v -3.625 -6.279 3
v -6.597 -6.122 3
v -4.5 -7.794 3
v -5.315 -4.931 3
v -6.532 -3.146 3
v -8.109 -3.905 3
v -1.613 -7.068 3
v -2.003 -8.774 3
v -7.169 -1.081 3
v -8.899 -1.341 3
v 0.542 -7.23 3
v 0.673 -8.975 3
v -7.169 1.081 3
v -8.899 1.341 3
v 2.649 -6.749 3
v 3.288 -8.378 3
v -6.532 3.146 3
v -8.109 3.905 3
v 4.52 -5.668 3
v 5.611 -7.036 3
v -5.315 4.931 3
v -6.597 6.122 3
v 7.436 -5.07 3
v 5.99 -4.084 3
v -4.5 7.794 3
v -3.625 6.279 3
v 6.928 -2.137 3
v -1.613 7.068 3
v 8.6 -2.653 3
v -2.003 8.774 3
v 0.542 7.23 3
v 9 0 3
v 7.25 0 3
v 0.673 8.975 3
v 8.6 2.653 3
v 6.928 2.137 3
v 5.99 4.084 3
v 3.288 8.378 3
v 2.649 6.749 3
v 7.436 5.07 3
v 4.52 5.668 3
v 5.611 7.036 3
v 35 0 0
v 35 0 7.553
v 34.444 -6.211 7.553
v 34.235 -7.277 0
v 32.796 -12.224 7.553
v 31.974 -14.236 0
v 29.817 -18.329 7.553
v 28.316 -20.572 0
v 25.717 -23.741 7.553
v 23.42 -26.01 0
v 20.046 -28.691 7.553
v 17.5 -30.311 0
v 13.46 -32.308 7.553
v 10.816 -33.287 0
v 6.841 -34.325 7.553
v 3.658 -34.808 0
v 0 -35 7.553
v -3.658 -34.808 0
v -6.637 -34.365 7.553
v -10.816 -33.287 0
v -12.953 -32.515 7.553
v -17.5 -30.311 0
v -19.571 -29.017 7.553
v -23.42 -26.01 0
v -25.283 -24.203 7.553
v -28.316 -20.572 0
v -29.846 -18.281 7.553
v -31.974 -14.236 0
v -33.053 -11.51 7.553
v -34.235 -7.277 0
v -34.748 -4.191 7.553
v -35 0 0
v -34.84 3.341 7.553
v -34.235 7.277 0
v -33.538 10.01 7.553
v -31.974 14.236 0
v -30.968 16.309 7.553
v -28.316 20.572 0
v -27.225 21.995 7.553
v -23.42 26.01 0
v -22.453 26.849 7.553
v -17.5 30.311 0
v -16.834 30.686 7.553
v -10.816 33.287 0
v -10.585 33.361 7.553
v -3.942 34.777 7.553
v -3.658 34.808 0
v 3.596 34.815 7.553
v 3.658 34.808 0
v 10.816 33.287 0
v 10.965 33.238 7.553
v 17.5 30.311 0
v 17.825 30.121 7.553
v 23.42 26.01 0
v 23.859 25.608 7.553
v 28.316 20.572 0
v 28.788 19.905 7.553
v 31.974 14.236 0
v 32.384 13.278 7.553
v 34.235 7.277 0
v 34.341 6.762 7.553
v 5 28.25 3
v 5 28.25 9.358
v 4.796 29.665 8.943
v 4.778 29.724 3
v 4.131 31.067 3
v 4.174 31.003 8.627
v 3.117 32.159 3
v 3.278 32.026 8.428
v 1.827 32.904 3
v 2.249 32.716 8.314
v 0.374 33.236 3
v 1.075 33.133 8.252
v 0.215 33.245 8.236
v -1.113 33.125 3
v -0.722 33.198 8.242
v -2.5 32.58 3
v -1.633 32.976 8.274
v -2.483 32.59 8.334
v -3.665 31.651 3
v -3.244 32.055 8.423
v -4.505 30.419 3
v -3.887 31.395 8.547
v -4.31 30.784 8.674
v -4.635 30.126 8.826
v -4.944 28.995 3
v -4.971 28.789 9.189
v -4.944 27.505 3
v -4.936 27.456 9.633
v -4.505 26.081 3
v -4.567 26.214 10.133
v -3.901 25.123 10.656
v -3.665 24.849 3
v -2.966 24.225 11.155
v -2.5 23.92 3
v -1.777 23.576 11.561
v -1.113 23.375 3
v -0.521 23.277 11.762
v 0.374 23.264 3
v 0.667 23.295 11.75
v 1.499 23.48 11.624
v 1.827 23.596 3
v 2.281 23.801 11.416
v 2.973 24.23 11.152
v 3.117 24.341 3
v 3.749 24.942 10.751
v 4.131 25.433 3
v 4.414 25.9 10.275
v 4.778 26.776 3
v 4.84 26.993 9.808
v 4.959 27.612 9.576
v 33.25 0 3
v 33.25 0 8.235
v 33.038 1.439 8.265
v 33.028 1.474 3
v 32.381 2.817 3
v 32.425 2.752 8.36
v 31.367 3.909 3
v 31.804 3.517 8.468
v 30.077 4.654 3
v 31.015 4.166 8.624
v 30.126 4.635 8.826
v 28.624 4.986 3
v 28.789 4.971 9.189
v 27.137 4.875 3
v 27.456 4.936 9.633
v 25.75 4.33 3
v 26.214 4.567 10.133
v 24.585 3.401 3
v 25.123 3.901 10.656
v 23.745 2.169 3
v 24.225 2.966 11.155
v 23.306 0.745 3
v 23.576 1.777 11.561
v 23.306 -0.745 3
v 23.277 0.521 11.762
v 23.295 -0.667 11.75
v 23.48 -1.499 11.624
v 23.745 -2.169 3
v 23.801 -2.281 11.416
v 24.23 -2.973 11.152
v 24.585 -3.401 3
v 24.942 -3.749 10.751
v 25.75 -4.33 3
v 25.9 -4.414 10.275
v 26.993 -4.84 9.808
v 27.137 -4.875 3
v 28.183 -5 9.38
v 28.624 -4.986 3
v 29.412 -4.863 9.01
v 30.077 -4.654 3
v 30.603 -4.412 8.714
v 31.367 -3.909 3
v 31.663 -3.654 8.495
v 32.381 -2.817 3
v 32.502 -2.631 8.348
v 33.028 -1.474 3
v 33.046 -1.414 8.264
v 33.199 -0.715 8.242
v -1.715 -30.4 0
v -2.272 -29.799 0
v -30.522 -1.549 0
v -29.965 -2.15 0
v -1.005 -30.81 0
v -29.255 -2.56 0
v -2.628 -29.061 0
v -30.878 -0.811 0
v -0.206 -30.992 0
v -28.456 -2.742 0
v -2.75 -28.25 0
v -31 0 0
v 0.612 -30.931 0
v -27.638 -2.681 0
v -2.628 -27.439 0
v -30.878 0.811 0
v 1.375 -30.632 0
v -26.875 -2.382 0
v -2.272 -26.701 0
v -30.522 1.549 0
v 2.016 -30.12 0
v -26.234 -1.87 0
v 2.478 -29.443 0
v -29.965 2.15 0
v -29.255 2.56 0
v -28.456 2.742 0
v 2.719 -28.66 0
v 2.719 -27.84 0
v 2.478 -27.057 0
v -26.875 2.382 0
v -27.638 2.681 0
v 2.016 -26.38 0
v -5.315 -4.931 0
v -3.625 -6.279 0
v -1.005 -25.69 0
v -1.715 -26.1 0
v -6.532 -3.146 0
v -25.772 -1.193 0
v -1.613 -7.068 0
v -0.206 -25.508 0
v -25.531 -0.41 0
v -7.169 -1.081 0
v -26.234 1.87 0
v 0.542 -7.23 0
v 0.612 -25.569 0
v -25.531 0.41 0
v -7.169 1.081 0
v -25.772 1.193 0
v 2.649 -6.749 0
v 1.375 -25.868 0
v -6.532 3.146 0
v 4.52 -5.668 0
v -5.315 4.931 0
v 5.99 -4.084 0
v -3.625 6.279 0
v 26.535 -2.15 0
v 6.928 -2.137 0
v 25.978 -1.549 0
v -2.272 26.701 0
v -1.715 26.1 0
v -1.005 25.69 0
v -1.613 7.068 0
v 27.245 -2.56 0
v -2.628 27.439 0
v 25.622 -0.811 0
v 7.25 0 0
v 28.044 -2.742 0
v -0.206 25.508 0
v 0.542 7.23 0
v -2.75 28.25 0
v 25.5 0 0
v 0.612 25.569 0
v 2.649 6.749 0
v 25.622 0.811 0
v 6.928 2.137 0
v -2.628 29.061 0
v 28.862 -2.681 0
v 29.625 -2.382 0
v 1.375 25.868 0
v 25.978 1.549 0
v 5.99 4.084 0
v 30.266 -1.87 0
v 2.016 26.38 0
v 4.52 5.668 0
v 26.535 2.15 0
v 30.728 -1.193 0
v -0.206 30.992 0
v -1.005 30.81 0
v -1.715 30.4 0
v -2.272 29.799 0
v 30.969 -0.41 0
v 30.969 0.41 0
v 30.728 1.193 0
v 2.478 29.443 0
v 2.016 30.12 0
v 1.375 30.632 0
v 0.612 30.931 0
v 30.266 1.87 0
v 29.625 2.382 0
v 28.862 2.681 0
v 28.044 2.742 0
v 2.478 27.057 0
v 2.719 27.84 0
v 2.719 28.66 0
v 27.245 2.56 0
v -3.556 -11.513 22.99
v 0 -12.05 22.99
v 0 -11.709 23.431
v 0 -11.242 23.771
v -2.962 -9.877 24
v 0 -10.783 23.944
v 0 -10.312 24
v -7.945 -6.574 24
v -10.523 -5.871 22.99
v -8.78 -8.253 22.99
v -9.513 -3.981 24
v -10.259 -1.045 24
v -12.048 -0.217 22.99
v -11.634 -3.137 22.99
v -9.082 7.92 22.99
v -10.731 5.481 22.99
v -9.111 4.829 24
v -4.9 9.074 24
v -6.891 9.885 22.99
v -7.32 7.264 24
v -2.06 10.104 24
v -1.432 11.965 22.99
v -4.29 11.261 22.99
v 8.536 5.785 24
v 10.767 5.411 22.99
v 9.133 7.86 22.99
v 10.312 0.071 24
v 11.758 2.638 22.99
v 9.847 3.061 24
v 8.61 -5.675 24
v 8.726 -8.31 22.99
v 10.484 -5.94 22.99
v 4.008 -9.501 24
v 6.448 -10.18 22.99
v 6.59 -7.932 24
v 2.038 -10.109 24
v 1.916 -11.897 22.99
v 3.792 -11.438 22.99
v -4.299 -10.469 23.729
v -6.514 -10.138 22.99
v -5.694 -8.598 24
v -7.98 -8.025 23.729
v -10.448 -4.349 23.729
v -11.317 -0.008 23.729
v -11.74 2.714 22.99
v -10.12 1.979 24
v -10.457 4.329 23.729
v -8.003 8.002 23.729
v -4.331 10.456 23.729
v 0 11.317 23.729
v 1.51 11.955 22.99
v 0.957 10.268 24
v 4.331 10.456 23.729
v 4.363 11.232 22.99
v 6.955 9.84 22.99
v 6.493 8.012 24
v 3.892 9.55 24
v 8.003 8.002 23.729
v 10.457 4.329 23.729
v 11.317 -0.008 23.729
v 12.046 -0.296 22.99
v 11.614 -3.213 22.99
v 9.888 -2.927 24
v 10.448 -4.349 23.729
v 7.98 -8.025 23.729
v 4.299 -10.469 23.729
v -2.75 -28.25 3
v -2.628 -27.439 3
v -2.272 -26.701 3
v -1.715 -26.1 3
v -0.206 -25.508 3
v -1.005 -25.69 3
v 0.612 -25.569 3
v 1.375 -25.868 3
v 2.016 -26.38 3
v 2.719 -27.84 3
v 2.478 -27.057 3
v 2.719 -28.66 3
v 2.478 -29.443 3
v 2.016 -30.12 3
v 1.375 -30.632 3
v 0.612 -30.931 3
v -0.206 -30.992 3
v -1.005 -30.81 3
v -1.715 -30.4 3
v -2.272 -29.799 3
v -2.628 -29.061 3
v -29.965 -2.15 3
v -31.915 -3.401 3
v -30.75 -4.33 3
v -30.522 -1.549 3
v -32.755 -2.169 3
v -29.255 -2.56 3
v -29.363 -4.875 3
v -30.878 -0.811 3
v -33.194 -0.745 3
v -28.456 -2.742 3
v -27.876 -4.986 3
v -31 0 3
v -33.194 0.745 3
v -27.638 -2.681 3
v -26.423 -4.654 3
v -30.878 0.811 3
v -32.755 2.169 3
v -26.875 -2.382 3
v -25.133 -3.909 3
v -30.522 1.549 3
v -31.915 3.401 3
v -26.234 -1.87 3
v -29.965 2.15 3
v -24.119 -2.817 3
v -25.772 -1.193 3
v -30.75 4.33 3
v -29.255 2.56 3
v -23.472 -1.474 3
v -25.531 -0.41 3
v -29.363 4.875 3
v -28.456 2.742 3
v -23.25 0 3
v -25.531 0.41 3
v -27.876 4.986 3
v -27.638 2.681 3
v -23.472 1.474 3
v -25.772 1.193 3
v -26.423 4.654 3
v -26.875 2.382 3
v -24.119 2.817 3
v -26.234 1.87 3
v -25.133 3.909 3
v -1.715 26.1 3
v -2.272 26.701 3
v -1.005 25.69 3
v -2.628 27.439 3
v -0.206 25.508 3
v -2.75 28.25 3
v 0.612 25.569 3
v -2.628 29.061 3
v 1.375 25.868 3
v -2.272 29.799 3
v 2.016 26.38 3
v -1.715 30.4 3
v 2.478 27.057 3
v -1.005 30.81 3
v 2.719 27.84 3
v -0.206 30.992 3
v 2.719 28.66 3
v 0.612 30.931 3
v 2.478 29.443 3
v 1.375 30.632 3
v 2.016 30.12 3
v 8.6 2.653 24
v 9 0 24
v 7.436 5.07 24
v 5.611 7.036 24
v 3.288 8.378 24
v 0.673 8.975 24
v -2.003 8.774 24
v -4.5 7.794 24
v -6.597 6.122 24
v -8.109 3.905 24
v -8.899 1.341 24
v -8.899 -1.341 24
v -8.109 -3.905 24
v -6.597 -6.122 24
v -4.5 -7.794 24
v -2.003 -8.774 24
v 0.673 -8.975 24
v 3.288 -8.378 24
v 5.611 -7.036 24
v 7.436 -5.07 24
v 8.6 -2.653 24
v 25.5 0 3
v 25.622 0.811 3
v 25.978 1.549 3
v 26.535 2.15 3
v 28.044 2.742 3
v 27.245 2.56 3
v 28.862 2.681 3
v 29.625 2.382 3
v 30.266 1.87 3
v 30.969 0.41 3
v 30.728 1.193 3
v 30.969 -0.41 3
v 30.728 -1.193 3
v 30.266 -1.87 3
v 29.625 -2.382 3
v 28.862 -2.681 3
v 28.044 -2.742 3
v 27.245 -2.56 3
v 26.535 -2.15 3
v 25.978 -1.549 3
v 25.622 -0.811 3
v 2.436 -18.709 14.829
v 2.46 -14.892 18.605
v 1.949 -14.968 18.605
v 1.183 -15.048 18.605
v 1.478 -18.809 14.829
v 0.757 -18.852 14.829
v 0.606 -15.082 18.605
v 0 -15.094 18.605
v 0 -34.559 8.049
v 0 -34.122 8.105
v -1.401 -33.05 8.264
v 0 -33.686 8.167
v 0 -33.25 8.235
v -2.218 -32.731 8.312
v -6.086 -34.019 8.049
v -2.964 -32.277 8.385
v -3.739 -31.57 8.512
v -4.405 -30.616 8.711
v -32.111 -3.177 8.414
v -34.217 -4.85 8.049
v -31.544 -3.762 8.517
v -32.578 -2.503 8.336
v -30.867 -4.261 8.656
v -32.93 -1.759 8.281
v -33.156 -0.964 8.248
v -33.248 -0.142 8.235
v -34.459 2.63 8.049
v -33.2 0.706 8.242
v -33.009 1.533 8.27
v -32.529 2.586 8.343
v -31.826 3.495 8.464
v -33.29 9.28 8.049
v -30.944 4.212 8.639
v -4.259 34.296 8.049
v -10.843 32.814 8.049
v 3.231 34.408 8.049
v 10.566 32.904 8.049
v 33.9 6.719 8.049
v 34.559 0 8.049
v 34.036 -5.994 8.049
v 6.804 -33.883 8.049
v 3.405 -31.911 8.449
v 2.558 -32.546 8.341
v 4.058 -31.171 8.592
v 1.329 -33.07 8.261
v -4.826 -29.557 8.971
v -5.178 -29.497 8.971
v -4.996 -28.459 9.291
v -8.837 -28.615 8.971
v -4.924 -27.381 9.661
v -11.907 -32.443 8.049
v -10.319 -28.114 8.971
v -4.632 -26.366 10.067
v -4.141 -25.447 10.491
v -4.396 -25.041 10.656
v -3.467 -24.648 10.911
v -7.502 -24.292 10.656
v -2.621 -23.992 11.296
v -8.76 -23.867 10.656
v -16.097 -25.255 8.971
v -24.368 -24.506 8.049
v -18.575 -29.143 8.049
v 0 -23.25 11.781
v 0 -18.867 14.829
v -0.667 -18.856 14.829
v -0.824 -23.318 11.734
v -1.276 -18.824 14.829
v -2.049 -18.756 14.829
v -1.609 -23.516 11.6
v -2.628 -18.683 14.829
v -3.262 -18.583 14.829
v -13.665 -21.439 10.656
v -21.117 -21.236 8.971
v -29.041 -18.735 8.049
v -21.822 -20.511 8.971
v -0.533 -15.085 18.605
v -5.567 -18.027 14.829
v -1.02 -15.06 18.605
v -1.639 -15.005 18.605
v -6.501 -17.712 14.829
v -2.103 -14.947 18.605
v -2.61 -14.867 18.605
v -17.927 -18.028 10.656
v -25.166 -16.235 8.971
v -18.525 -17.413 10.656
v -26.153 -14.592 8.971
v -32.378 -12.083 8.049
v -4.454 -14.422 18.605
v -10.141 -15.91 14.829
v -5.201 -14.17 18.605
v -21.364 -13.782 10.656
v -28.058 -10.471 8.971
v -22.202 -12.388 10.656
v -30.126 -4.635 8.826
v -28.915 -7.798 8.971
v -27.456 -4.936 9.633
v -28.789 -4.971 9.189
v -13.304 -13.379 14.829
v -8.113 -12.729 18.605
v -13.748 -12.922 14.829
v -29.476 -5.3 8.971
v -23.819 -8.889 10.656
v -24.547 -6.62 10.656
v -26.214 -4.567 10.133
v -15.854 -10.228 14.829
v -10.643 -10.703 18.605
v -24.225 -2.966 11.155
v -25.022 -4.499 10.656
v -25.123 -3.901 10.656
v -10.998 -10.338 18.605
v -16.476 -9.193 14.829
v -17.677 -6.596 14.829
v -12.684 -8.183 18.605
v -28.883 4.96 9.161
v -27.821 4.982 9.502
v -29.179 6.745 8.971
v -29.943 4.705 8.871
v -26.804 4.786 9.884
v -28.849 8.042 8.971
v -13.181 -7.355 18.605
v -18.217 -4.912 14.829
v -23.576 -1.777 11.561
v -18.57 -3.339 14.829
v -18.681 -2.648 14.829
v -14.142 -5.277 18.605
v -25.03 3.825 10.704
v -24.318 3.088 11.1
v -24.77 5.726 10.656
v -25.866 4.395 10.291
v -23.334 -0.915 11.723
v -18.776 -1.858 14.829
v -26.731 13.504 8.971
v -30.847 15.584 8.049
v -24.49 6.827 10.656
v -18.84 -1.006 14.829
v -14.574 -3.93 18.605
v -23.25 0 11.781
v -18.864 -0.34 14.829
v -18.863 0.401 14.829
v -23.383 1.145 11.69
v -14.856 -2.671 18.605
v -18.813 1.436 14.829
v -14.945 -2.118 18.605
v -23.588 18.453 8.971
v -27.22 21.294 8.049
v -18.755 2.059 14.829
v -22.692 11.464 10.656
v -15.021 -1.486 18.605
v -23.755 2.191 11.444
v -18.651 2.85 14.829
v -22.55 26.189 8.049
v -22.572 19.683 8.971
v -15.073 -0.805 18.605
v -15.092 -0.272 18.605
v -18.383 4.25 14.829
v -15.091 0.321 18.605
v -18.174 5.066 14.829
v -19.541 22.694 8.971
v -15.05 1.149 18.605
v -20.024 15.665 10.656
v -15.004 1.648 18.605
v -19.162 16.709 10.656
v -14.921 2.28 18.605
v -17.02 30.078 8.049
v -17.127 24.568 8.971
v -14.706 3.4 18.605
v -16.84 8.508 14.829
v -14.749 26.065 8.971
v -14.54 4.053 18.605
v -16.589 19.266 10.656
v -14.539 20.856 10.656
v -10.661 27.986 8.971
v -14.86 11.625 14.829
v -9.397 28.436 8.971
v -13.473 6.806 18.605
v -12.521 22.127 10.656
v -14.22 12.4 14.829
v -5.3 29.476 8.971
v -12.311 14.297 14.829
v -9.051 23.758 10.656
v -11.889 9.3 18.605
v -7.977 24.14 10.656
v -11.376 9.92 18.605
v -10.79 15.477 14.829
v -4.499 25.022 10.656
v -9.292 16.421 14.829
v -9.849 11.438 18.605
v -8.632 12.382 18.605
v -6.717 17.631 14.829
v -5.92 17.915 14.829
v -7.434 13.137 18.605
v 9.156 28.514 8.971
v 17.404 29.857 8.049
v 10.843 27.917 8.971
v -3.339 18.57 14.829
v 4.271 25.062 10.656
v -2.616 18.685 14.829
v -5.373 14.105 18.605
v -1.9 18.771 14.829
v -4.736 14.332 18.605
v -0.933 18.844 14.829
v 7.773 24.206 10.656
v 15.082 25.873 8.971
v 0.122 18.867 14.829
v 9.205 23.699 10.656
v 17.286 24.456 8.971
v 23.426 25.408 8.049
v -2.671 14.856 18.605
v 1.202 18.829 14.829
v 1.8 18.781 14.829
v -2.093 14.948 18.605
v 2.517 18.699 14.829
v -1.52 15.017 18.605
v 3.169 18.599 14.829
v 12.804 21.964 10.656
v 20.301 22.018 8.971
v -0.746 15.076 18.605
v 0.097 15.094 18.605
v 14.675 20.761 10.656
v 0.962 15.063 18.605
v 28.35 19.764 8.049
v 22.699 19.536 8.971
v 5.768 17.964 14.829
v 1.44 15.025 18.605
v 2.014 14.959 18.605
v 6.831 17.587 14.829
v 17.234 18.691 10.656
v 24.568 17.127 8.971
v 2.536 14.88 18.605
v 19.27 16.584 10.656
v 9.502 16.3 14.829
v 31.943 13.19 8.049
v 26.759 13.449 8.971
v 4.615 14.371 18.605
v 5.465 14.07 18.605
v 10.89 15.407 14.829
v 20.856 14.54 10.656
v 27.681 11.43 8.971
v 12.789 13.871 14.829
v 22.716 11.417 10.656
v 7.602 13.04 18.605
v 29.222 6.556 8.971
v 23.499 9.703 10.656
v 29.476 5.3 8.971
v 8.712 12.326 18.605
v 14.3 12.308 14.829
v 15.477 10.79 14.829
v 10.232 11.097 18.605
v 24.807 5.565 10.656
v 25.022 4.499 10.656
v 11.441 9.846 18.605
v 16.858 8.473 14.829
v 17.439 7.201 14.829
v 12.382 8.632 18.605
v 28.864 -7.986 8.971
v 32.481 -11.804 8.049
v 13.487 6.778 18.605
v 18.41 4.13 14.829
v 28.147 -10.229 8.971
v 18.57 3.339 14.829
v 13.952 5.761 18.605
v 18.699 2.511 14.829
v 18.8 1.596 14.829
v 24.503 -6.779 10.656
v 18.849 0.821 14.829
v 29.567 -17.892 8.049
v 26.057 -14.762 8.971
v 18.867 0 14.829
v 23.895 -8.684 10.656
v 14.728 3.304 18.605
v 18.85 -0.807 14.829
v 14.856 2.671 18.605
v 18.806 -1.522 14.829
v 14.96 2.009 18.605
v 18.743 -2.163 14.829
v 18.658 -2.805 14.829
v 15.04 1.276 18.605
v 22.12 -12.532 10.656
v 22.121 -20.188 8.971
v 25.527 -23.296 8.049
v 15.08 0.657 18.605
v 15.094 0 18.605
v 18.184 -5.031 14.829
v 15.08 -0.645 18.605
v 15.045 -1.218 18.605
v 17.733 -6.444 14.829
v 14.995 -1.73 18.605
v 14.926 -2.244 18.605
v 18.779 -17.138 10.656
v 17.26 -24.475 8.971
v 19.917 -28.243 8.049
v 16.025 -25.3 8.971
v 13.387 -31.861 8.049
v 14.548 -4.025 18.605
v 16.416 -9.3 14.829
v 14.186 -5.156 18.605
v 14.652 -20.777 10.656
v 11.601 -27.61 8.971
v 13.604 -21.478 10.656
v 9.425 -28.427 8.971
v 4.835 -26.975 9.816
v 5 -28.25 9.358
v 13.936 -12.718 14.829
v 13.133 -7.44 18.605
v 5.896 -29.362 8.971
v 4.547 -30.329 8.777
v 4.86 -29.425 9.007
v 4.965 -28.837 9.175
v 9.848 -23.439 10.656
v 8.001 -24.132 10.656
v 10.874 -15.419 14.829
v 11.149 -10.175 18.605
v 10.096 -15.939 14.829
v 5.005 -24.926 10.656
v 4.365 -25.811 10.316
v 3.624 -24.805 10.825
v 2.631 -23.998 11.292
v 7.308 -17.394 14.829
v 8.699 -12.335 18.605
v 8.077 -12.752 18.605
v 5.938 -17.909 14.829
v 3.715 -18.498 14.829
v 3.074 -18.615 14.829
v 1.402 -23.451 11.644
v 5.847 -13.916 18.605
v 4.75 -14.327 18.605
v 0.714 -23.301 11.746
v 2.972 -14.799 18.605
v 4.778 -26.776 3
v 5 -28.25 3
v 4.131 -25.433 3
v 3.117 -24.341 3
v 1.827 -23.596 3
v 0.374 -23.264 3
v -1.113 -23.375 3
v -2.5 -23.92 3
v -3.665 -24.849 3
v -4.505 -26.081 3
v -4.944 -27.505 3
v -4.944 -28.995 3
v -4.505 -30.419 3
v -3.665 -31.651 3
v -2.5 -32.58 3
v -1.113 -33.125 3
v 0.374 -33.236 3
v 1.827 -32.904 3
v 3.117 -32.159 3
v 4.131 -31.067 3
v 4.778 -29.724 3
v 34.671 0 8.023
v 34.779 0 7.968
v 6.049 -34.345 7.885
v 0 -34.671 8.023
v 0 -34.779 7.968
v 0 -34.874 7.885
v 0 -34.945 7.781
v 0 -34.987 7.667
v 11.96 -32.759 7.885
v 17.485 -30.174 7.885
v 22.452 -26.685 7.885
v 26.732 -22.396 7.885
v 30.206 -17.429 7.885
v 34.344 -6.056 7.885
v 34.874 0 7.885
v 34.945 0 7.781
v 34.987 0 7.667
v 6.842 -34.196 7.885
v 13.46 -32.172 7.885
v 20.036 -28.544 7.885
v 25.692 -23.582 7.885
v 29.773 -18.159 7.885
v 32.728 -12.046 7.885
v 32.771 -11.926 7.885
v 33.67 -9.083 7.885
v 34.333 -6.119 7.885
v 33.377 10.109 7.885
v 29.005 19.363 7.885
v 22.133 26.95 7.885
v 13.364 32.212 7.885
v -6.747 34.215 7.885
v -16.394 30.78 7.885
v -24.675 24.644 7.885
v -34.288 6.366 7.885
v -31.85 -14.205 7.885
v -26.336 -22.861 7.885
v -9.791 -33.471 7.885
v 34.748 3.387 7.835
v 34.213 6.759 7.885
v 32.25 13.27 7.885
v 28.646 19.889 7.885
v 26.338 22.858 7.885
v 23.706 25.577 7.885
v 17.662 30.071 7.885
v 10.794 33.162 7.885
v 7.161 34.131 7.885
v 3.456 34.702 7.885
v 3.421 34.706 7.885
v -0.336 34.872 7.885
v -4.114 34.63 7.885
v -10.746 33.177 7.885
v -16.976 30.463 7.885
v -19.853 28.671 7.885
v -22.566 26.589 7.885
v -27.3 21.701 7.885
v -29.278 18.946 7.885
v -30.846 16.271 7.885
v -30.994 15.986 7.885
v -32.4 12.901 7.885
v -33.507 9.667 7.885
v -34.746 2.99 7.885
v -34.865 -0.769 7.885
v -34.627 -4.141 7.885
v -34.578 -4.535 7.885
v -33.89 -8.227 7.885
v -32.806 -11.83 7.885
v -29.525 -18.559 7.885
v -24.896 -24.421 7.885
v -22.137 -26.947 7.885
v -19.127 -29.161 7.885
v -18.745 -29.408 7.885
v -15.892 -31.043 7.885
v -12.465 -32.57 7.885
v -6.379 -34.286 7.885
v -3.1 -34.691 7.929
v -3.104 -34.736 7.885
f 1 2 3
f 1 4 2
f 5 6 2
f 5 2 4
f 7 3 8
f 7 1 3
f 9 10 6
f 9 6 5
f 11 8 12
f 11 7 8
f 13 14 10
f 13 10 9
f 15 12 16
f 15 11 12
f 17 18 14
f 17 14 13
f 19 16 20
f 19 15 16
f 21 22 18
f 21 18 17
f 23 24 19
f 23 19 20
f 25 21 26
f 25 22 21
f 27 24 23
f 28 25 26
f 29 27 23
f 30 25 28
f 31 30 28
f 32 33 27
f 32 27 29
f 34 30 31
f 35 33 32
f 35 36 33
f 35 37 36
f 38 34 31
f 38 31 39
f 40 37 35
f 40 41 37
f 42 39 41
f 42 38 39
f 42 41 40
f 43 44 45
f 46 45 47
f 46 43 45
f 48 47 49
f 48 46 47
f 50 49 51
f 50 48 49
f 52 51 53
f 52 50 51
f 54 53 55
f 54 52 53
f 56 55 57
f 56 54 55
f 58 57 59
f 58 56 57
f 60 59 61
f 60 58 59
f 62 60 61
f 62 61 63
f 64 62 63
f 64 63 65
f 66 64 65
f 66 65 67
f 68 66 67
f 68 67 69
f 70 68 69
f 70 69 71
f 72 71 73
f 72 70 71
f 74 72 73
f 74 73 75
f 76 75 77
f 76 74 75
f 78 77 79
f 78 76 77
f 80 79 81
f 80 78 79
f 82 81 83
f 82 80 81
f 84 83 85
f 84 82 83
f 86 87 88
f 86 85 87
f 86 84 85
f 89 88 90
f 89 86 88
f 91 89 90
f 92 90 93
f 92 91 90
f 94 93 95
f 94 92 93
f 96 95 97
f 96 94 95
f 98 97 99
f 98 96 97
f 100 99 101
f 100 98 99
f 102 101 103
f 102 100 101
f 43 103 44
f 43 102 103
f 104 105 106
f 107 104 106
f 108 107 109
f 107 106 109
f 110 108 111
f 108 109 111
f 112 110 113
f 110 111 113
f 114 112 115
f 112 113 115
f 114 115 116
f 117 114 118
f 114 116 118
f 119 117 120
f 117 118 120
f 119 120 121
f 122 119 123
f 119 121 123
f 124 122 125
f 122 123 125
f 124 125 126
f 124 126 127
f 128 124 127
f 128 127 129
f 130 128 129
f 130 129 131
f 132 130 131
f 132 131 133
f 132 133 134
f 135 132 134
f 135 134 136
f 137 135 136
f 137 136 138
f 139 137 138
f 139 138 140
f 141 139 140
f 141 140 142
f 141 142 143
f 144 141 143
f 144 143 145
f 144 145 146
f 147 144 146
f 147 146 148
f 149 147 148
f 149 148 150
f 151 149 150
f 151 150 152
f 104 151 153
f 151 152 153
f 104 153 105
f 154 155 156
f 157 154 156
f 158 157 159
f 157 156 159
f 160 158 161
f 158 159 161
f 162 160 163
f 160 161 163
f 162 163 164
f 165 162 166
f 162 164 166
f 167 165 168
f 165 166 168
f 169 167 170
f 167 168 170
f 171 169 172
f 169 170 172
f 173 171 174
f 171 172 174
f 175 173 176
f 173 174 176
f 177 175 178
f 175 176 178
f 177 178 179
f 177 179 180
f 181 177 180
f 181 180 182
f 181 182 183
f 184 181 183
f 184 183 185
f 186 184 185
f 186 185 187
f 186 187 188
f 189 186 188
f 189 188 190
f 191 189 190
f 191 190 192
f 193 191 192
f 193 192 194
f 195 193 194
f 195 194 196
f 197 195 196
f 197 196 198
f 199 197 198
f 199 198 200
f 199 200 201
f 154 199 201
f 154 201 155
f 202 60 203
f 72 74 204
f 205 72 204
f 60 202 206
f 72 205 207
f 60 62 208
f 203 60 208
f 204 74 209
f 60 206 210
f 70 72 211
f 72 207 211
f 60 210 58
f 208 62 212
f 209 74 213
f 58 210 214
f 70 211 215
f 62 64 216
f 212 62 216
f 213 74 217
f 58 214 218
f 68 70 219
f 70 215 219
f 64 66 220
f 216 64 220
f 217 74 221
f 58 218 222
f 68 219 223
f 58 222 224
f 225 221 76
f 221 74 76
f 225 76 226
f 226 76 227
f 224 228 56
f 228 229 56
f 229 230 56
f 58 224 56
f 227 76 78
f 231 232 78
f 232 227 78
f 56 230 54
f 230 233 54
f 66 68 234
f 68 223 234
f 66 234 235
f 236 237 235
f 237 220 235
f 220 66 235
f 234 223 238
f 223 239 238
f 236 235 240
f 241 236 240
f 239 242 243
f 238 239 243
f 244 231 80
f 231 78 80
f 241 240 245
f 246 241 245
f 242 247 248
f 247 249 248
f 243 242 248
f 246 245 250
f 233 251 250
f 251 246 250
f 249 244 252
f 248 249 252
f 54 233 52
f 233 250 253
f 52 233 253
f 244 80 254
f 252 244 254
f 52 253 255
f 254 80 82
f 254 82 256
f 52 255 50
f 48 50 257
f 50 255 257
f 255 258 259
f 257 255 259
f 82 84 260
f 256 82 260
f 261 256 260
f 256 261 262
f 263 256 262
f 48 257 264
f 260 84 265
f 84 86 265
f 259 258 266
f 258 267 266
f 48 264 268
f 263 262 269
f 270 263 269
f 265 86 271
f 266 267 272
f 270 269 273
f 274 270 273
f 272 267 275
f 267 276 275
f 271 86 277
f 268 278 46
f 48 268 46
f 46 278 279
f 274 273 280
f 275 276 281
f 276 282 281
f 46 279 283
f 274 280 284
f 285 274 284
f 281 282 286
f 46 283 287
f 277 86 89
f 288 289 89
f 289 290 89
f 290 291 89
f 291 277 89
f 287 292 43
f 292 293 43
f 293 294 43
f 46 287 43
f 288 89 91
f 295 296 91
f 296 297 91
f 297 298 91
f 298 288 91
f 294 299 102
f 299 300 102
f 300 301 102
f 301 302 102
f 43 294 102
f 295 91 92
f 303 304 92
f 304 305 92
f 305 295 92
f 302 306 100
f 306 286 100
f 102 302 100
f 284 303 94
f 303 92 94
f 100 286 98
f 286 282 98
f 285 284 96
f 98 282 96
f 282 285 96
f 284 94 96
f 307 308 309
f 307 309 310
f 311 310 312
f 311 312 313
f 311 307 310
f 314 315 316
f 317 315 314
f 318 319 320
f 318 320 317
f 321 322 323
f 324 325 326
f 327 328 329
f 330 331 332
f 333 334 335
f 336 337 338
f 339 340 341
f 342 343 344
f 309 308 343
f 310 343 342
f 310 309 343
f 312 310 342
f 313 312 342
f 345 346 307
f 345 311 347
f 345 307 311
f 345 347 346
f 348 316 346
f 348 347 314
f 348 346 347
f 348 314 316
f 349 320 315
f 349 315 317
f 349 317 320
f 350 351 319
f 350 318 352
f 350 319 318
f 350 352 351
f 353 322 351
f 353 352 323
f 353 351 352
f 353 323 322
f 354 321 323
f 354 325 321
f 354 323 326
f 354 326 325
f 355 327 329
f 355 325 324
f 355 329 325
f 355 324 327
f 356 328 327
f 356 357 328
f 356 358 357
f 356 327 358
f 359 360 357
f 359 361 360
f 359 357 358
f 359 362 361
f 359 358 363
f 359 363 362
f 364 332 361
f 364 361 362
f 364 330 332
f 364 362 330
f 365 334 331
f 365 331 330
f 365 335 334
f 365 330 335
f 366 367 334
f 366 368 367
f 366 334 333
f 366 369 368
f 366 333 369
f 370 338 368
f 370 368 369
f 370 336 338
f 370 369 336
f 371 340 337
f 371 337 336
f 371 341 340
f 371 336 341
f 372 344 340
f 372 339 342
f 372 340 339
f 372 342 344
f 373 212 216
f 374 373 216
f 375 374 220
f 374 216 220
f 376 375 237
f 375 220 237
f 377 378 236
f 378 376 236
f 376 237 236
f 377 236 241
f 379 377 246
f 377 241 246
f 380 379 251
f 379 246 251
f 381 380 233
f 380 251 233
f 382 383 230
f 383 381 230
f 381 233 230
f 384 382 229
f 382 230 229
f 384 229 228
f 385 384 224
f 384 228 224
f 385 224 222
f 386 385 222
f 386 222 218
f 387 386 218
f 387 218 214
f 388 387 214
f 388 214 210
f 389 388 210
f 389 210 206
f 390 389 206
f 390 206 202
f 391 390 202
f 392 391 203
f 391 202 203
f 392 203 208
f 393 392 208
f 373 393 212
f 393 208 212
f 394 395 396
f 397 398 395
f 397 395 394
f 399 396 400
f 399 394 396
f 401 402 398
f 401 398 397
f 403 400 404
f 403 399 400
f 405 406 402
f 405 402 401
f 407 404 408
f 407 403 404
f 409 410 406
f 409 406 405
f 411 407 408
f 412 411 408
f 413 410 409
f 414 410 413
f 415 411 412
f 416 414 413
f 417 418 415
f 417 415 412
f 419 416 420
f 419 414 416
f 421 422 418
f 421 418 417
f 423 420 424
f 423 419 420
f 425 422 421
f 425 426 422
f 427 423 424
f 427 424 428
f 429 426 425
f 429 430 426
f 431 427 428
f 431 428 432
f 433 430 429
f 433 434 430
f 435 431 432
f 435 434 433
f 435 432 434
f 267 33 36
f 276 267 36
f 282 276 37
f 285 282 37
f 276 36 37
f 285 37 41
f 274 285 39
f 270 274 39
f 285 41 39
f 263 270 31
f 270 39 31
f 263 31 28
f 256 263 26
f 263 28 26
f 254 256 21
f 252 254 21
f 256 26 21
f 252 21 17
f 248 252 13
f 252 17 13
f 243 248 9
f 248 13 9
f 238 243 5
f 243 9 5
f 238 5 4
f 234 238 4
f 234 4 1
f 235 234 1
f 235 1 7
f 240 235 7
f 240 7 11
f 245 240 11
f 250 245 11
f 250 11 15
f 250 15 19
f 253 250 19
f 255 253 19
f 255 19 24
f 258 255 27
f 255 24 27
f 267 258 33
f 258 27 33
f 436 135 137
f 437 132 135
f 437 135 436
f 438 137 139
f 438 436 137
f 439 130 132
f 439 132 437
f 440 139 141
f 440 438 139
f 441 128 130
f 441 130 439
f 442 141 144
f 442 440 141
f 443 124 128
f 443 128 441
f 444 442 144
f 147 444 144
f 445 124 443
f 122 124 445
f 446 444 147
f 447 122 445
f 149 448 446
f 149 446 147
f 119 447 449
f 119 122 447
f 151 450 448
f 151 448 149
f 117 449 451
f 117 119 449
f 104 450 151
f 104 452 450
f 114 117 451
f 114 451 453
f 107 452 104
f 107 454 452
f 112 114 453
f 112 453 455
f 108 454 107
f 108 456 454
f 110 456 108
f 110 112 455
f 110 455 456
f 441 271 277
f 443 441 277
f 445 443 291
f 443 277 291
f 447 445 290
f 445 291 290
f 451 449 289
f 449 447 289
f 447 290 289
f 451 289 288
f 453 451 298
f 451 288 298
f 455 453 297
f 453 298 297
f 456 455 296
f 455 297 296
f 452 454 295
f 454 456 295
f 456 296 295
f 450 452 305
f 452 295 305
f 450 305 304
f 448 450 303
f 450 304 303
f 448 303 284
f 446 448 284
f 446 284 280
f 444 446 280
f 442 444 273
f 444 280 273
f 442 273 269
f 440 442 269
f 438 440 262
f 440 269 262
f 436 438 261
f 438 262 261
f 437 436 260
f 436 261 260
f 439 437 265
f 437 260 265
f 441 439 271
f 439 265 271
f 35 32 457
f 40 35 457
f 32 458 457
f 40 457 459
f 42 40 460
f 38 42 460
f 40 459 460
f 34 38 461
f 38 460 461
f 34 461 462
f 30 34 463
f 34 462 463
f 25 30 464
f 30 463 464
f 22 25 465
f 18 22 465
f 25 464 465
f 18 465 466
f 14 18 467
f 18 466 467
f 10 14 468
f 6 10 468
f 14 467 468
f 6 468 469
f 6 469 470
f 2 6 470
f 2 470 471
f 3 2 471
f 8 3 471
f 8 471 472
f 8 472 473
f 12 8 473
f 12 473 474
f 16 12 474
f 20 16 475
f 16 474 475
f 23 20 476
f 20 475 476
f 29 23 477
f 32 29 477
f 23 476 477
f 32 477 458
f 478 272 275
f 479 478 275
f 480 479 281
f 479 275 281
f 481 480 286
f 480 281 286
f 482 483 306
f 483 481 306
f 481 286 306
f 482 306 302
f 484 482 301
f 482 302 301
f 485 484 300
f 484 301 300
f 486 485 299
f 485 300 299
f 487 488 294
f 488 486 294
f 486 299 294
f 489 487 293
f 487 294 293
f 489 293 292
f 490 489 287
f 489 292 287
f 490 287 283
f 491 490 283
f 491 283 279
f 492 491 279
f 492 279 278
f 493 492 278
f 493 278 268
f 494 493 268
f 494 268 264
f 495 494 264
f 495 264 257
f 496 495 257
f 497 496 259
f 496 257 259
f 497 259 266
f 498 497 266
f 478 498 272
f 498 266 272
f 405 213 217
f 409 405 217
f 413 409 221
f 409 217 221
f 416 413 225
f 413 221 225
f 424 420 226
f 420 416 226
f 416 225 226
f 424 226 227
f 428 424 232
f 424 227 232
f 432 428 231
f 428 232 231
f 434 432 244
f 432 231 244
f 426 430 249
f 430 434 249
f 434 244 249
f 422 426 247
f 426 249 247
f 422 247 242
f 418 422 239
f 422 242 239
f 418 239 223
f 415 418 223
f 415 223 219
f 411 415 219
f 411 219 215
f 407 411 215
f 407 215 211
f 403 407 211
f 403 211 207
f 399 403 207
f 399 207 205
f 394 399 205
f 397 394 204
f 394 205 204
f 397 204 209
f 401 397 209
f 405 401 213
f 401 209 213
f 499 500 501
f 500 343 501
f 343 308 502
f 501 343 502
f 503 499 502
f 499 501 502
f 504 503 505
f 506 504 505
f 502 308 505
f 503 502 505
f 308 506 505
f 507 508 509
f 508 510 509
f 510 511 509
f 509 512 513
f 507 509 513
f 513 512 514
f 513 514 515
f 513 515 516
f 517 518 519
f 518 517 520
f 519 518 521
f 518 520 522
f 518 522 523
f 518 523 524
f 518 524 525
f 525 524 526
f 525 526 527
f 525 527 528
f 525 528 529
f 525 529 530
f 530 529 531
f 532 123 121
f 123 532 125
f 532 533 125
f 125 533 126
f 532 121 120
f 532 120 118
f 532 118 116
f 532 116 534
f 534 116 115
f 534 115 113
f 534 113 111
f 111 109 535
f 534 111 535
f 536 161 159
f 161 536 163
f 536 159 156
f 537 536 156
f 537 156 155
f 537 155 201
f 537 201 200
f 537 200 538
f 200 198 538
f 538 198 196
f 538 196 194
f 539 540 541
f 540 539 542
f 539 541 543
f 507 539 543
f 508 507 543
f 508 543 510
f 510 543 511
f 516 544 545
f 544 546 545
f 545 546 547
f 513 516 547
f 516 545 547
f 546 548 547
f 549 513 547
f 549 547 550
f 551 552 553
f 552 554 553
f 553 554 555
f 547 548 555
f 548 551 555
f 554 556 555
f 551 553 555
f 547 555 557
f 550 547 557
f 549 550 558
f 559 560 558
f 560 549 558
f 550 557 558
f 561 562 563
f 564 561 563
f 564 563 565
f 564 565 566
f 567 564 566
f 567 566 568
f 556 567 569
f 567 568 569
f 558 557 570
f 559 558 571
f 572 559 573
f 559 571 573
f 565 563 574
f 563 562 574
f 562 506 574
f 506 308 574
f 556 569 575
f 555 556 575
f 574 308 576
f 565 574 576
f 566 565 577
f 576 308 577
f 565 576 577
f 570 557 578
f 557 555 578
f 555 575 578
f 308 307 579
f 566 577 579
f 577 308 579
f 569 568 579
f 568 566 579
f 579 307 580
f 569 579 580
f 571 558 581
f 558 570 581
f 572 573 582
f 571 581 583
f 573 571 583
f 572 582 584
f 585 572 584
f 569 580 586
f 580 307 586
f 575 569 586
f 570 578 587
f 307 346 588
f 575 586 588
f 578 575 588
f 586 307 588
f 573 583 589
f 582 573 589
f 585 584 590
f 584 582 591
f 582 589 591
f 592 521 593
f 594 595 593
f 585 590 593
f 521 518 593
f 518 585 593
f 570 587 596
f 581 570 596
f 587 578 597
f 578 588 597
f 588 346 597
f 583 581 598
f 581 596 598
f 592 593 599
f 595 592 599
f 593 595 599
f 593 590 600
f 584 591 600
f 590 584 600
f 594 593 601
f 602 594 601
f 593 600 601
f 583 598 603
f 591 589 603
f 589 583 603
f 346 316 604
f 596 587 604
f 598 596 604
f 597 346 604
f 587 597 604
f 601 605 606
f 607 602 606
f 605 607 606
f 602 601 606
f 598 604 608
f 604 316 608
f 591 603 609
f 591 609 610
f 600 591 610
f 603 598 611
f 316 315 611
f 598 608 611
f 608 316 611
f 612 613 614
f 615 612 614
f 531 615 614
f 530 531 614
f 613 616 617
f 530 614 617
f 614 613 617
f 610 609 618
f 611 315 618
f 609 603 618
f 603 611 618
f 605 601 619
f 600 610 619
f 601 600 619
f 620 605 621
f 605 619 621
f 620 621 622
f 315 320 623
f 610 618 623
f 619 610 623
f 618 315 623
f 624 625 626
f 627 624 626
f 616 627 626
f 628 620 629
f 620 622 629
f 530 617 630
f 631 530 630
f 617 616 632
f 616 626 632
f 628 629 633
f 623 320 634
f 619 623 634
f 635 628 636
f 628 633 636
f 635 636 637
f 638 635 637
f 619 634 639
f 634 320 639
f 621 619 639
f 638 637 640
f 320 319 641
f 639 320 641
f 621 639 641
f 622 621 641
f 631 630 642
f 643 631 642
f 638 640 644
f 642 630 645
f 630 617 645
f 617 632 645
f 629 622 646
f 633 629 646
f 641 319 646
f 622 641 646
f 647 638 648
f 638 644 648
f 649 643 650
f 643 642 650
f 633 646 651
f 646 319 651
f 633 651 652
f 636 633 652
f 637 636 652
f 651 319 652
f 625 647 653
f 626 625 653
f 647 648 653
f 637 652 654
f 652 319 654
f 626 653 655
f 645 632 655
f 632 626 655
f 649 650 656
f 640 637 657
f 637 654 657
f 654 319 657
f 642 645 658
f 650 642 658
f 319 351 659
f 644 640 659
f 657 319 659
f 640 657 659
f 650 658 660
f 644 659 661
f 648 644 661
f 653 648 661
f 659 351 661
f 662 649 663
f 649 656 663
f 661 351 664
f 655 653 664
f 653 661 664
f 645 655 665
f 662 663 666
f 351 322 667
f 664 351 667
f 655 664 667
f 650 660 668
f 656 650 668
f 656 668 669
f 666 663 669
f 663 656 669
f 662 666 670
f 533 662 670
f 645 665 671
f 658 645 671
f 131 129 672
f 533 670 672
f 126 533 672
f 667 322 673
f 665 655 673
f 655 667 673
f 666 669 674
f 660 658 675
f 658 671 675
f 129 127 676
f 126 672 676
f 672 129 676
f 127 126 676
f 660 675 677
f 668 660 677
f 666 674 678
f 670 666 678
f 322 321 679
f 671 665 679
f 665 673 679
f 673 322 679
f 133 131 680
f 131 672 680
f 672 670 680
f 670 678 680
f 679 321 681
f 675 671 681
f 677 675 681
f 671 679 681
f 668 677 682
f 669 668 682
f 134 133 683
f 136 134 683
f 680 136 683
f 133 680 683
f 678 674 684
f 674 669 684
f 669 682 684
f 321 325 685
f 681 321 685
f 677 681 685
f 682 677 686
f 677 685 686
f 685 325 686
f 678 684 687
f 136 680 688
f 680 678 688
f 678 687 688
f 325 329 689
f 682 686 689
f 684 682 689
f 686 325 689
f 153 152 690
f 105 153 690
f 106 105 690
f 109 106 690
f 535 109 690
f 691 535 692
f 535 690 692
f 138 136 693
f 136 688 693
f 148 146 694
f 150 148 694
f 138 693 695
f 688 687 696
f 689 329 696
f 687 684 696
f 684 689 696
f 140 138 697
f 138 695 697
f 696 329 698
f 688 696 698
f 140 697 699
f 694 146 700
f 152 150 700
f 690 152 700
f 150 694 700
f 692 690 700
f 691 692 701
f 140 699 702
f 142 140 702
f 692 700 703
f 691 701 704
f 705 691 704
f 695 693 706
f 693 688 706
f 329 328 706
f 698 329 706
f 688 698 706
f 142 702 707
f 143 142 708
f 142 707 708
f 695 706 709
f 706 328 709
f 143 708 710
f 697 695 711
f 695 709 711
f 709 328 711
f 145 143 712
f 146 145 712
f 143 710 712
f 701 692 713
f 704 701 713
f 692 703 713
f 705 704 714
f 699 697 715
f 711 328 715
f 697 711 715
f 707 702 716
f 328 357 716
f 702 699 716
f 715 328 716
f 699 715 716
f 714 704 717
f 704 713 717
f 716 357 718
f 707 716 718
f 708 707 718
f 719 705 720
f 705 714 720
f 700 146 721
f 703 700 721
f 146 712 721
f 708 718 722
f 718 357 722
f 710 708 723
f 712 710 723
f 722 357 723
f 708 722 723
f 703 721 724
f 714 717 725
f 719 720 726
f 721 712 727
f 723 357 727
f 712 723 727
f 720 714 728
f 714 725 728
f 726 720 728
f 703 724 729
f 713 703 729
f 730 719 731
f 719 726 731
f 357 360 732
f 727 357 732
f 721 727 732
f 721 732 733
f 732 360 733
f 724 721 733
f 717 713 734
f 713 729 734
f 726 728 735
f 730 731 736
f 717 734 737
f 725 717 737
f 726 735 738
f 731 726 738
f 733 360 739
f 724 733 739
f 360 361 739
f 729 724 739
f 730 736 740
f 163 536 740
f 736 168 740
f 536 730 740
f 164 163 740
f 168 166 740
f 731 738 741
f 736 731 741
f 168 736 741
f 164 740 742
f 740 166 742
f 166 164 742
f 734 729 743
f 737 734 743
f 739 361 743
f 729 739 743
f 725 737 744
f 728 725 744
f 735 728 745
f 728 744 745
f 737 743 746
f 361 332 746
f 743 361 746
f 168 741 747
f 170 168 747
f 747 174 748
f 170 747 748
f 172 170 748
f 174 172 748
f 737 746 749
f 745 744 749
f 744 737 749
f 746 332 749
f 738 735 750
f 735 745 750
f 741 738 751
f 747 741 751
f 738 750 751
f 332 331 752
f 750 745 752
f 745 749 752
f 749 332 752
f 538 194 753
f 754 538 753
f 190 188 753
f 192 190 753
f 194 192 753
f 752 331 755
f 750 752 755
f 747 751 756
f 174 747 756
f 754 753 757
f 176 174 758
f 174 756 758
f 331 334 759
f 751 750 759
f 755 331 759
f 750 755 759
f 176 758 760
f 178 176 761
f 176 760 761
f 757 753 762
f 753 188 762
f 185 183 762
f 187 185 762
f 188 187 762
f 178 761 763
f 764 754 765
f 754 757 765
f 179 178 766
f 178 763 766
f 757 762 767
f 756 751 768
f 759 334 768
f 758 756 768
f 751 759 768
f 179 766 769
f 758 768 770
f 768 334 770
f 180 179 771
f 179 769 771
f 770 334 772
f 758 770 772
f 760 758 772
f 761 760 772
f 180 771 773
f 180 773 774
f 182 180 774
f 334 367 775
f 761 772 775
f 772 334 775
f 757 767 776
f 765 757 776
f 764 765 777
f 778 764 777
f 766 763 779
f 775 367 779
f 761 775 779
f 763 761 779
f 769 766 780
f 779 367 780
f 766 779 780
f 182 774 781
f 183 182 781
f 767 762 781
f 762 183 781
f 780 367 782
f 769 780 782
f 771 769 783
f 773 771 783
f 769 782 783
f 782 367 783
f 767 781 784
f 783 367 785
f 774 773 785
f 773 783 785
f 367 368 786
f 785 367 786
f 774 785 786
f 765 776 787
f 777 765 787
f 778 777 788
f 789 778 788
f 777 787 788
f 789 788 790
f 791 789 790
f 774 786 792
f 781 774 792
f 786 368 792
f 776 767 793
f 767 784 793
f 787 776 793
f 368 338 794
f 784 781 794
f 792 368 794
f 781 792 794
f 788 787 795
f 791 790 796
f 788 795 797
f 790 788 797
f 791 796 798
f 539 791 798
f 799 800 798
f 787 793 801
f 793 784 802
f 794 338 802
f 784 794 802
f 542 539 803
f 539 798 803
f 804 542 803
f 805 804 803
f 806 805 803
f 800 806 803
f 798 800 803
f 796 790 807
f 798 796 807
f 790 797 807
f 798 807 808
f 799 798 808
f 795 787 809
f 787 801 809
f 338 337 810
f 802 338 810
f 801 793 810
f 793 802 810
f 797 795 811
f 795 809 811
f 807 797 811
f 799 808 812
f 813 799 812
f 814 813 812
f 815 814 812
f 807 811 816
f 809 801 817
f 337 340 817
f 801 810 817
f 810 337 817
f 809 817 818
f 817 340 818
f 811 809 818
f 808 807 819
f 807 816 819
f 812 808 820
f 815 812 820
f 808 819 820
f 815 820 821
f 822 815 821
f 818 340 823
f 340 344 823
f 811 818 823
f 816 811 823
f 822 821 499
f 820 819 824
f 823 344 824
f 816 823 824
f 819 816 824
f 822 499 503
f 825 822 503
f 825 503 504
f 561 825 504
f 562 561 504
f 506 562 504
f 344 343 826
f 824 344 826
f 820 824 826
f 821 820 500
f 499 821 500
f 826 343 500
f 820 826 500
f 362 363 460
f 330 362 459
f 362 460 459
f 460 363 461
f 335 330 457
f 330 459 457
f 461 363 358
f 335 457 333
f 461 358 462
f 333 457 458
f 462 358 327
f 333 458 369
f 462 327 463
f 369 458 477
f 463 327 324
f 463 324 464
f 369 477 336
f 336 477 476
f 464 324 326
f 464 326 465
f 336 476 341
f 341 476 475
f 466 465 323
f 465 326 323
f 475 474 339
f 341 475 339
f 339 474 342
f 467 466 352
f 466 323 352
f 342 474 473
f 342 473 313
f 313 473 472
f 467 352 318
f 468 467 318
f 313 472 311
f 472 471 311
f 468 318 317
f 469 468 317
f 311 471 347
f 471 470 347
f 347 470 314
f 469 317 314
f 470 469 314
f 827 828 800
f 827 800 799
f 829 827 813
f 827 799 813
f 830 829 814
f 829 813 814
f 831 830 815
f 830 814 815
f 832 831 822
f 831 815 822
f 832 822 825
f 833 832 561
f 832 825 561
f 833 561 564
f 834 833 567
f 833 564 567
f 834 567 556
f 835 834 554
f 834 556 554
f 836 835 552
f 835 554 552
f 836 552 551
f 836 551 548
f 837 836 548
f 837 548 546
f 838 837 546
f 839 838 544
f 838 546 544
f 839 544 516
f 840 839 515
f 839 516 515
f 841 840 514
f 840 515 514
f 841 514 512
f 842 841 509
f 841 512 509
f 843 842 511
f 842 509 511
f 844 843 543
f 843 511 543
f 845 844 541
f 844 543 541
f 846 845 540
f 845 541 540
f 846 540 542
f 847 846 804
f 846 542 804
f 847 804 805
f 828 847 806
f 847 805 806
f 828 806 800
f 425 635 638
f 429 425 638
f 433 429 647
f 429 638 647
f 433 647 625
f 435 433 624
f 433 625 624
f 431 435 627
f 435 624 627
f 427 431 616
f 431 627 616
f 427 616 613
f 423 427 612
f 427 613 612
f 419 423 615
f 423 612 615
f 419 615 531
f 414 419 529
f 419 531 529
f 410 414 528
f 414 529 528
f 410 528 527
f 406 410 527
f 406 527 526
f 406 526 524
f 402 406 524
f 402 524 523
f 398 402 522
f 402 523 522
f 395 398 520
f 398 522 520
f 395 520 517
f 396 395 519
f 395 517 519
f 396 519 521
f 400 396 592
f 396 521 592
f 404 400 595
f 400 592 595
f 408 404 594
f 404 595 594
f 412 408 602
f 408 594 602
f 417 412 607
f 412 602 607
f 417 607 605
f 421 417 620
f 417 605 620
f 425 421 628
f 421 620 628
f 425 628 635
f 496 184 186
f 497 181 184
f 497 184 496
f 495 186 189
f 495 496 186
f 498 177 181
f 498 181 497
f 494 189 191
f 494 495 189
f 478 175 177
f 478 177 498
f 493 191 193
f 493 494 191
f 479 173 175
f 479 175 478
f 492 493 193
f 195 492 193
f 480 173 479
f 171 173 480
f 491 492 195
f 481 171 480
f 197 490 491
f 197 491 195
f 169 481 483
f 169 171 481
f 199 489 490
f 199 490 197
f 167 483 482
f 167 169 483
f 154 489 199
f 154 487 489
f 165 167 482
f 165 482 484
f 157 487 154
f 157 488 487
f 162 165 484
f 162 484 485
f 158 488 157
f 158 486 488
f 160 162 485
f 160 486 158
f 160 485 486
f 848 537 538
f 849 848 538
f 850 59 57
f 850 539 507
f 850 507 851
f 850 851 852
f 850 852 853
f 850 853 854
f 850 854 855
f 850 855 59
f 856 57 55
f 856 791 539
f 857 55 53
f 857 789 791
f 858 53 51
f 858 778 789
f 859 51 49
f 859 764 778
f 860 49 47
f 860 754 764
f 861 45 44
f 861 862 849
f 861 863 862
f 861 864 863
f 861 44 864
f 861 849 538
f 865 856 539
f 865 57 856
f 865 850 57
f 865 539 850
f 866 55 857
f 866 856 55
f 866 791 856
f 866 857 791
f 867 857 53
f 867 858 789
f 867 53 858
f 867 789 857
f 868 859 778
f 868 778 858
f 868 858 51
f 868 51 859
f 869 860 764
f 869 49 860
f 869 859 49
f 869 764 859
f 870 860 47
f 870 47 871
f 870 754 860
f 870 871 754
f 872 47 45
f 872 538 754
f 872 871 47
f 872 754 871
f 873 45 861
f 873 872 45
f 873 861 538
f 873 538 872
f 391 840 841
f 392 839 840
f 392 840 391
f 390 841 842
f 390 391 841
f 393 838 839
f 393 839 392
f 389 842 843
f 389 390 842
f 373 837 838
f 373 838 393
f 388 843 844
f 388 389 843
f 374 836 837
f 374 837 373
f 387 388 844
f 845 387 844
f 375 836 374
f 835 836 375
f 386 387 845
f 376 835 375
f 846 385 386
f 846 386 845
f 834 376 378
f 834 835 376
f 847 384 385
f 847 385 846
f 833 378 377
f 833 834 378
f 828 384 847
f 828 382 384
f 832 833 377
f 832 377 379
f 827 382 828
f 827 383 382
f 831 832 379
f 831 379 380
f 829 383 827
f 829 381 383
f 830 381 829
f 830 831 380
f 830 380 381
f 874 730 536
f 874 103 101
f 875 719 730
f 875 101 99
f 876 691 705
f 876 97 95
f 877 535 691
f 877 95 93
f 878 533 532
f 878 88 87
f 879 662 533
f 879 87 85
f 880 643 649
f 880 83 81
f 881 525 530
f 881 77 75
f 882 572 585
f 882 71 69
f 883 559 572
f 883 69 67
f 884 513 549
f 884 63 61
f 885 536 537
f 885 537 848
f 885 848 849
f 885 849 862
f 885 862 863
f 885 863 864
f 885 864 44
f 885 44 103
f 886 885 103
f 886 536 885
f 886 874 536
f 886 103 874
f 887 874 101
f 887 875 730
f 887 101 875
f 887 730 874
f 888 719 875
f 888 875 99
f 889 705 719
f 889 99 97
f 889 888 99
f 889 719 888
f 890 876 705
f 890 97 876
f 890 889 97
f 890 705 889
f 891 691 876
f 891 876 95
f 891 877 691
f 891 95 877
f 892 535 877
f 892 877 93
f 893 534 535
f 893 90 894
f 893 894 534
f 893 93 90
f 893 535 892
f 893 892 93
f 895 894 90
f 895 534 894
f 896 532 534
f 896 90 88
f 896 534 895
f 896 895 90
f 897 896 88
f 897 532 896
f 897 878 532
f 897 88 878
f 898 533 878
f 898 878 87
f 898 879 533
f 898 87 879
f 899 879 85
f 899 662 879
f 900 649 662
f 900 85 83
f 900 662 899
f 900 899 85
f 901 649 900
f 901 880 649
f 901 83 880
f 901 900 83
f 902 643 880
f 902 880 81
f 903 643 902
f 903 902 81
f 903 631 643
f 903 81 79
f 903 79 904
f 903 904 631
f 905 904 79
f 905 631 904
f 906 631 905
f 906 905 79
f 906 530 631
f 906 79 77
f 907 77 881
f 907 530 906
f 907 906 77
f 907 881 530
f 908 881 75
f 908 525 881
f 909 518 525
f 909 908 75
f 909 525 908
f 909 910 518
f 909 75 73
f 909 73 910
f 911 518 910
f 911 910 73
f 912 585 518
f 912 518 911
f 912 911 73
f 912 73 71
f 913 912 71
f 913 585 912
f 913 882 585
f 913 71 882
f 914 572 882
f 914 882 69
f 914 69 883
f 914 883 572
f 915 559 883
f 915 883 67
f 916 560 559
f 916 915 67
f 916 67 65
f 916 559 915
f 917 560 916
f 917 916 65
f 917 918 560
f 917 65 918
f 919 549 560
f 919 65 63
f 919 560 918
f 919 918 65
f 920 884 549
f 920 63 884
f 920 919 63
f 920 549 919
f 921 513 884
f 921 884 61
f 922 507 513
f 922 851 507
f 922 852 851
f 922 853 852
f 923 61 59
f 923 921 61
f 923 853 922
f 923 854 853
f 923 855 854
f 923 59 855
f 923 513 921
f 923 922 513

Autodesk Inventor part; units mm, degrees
ref_plane "YZ Plane" through (0, 0, 0) normal (1, 0, 0) x (0, 1, 0)
ref_plane "XZ Plane" through (0, 0, 0) normal (0, 1, 0) x (-1, 0, 0)
ref_plane "XY Plane" through (0, 0, 0) normal (0, 0, 1) x (1, 0, 0)
sketch "Sketch1" plane through (0, 0, 0) normal (0, 0, 1) x (1, 0, 0)
  circle A0 centre (0, 0) radius 35
  dimension "d0" = 70
extrude "Extrusion1" add sketch "Sketch1" along normal blind 8
sketch "Sketch2" plane through (0, 0, 0) normal (1, 0, 0) x (0, 1, 0)
  line L0 (11.5, 24) -> (-11.5, 24)
  line L1 (35, 0) -> (35, 8) projected
  arc A0 (11.5, 24) -> (35, 8) centre (38.1181, 37.8375) ccw
  line L2 (35, 8) -> (-35, 8) projected
  arc A1 (-35, 8) -> (-11.5, 24) centre (-38.1181, 37.8375) ccw
  line L3 (35, 8) -> (0, 8)
  line L4 (0, 24) -> (0, 8)
  line L5 (-35, 0) -> (35, 0) projected
  point P0 (0, 0)
  dimension "d3" = 23
  dimension "d4" = 11.5
  dimension "d5" = 30
  dimension "d6" = 30
  dimension "d14" = 24
revolve "Revolution1" add sketch "Sketch2" angle 360 about axis through (0, 0, 24) along (0, 0, -1) contours L4 L2 A1 L0
sketch "Sketch3" plane through (0, 0, 24) normal (0, 0, 1) x (1, 0, 0)
  circle A0 centre (0, 0) radius 7.25
  dimension "d8" = 14.5
extrude "Extrusion2" cut sketch "Sketch3" against normal through all
sketch "Sketch4" plane through (0, 0, 24) normal (0, 0, 1) x (1, 0, 0)
  circle A0 centre (0, 0) radius 9
  dimension "d11" = 18
extrude "Extrusion3" cut sketch "Sketch4" against normal blind 21
sketch "Sketch5" plane through (0, 0, 0) normal (0, 0, -1) x (-1, 0, 0)
  circle A0 centre (0, 0) radius 28.25
  circle A1 centre (0, 28.25) radius 2.75
  circle A2 centre (-28.25, 0) radius 2.75
  circle A3 centre (0, -28.25) radius 2.75
  circle A4 centre (28.25, 0) radius 2.75
  dimension "d15" = 56.5
  dimension "d16" = 5.5
  dimension "d19" = 360
extrude "Extrusion4" cut sketch "Sketch5" against normal through all contours A0 A4 | A0 A4 | A1 A0 | A0 A1 | A3 A0 | A0 A3 | A2 A0 | A0 A2
sketch "Sketch7" plane through (0, 0, 24) normal (0, 0, 1) x (1, 0, 0)
  circle A0 centre (-28.25, 0) radius 2.75 projected
  circle A1 centre (-28.25, 0) radius 5
  circle A2 centre (0, 28.25) radius 2.75 projected
  circle A3 centre (0, 28.25) radius 5
  circle A4 centre (28.25, 0) radius 2.75 projected
  circle A5 centre (28.25, 0) radius 5
  circle A6 centre (0, -28.25) radius 2.75 projected
  circle A7 centre (0, -28.25) radius 5
  point P0 (0, 0)
  dimension "d27" = 10
  dimension "d28" = 10
  dimension "d29" = 10
  dimension "d30" = 10
extrude "Extrusion5" cut sketch "Sketch7" against normal blind 21
fillet "Fillet1" radius 2 1 edges at (0, 11.5, 24)
fillet "Fillet2" radius 0.5 2 edges at (-24.7487, 24.7487, 8) (24.7487, -24.7487, 8)
equation "\"d4\" = 0.5 * d3"
equation "\"d6\" = d5"
equation "\"d28\" = d27"
equation "\"d29\" = d28"
equation "\"d30\" = d27"
properties part number "Base"
